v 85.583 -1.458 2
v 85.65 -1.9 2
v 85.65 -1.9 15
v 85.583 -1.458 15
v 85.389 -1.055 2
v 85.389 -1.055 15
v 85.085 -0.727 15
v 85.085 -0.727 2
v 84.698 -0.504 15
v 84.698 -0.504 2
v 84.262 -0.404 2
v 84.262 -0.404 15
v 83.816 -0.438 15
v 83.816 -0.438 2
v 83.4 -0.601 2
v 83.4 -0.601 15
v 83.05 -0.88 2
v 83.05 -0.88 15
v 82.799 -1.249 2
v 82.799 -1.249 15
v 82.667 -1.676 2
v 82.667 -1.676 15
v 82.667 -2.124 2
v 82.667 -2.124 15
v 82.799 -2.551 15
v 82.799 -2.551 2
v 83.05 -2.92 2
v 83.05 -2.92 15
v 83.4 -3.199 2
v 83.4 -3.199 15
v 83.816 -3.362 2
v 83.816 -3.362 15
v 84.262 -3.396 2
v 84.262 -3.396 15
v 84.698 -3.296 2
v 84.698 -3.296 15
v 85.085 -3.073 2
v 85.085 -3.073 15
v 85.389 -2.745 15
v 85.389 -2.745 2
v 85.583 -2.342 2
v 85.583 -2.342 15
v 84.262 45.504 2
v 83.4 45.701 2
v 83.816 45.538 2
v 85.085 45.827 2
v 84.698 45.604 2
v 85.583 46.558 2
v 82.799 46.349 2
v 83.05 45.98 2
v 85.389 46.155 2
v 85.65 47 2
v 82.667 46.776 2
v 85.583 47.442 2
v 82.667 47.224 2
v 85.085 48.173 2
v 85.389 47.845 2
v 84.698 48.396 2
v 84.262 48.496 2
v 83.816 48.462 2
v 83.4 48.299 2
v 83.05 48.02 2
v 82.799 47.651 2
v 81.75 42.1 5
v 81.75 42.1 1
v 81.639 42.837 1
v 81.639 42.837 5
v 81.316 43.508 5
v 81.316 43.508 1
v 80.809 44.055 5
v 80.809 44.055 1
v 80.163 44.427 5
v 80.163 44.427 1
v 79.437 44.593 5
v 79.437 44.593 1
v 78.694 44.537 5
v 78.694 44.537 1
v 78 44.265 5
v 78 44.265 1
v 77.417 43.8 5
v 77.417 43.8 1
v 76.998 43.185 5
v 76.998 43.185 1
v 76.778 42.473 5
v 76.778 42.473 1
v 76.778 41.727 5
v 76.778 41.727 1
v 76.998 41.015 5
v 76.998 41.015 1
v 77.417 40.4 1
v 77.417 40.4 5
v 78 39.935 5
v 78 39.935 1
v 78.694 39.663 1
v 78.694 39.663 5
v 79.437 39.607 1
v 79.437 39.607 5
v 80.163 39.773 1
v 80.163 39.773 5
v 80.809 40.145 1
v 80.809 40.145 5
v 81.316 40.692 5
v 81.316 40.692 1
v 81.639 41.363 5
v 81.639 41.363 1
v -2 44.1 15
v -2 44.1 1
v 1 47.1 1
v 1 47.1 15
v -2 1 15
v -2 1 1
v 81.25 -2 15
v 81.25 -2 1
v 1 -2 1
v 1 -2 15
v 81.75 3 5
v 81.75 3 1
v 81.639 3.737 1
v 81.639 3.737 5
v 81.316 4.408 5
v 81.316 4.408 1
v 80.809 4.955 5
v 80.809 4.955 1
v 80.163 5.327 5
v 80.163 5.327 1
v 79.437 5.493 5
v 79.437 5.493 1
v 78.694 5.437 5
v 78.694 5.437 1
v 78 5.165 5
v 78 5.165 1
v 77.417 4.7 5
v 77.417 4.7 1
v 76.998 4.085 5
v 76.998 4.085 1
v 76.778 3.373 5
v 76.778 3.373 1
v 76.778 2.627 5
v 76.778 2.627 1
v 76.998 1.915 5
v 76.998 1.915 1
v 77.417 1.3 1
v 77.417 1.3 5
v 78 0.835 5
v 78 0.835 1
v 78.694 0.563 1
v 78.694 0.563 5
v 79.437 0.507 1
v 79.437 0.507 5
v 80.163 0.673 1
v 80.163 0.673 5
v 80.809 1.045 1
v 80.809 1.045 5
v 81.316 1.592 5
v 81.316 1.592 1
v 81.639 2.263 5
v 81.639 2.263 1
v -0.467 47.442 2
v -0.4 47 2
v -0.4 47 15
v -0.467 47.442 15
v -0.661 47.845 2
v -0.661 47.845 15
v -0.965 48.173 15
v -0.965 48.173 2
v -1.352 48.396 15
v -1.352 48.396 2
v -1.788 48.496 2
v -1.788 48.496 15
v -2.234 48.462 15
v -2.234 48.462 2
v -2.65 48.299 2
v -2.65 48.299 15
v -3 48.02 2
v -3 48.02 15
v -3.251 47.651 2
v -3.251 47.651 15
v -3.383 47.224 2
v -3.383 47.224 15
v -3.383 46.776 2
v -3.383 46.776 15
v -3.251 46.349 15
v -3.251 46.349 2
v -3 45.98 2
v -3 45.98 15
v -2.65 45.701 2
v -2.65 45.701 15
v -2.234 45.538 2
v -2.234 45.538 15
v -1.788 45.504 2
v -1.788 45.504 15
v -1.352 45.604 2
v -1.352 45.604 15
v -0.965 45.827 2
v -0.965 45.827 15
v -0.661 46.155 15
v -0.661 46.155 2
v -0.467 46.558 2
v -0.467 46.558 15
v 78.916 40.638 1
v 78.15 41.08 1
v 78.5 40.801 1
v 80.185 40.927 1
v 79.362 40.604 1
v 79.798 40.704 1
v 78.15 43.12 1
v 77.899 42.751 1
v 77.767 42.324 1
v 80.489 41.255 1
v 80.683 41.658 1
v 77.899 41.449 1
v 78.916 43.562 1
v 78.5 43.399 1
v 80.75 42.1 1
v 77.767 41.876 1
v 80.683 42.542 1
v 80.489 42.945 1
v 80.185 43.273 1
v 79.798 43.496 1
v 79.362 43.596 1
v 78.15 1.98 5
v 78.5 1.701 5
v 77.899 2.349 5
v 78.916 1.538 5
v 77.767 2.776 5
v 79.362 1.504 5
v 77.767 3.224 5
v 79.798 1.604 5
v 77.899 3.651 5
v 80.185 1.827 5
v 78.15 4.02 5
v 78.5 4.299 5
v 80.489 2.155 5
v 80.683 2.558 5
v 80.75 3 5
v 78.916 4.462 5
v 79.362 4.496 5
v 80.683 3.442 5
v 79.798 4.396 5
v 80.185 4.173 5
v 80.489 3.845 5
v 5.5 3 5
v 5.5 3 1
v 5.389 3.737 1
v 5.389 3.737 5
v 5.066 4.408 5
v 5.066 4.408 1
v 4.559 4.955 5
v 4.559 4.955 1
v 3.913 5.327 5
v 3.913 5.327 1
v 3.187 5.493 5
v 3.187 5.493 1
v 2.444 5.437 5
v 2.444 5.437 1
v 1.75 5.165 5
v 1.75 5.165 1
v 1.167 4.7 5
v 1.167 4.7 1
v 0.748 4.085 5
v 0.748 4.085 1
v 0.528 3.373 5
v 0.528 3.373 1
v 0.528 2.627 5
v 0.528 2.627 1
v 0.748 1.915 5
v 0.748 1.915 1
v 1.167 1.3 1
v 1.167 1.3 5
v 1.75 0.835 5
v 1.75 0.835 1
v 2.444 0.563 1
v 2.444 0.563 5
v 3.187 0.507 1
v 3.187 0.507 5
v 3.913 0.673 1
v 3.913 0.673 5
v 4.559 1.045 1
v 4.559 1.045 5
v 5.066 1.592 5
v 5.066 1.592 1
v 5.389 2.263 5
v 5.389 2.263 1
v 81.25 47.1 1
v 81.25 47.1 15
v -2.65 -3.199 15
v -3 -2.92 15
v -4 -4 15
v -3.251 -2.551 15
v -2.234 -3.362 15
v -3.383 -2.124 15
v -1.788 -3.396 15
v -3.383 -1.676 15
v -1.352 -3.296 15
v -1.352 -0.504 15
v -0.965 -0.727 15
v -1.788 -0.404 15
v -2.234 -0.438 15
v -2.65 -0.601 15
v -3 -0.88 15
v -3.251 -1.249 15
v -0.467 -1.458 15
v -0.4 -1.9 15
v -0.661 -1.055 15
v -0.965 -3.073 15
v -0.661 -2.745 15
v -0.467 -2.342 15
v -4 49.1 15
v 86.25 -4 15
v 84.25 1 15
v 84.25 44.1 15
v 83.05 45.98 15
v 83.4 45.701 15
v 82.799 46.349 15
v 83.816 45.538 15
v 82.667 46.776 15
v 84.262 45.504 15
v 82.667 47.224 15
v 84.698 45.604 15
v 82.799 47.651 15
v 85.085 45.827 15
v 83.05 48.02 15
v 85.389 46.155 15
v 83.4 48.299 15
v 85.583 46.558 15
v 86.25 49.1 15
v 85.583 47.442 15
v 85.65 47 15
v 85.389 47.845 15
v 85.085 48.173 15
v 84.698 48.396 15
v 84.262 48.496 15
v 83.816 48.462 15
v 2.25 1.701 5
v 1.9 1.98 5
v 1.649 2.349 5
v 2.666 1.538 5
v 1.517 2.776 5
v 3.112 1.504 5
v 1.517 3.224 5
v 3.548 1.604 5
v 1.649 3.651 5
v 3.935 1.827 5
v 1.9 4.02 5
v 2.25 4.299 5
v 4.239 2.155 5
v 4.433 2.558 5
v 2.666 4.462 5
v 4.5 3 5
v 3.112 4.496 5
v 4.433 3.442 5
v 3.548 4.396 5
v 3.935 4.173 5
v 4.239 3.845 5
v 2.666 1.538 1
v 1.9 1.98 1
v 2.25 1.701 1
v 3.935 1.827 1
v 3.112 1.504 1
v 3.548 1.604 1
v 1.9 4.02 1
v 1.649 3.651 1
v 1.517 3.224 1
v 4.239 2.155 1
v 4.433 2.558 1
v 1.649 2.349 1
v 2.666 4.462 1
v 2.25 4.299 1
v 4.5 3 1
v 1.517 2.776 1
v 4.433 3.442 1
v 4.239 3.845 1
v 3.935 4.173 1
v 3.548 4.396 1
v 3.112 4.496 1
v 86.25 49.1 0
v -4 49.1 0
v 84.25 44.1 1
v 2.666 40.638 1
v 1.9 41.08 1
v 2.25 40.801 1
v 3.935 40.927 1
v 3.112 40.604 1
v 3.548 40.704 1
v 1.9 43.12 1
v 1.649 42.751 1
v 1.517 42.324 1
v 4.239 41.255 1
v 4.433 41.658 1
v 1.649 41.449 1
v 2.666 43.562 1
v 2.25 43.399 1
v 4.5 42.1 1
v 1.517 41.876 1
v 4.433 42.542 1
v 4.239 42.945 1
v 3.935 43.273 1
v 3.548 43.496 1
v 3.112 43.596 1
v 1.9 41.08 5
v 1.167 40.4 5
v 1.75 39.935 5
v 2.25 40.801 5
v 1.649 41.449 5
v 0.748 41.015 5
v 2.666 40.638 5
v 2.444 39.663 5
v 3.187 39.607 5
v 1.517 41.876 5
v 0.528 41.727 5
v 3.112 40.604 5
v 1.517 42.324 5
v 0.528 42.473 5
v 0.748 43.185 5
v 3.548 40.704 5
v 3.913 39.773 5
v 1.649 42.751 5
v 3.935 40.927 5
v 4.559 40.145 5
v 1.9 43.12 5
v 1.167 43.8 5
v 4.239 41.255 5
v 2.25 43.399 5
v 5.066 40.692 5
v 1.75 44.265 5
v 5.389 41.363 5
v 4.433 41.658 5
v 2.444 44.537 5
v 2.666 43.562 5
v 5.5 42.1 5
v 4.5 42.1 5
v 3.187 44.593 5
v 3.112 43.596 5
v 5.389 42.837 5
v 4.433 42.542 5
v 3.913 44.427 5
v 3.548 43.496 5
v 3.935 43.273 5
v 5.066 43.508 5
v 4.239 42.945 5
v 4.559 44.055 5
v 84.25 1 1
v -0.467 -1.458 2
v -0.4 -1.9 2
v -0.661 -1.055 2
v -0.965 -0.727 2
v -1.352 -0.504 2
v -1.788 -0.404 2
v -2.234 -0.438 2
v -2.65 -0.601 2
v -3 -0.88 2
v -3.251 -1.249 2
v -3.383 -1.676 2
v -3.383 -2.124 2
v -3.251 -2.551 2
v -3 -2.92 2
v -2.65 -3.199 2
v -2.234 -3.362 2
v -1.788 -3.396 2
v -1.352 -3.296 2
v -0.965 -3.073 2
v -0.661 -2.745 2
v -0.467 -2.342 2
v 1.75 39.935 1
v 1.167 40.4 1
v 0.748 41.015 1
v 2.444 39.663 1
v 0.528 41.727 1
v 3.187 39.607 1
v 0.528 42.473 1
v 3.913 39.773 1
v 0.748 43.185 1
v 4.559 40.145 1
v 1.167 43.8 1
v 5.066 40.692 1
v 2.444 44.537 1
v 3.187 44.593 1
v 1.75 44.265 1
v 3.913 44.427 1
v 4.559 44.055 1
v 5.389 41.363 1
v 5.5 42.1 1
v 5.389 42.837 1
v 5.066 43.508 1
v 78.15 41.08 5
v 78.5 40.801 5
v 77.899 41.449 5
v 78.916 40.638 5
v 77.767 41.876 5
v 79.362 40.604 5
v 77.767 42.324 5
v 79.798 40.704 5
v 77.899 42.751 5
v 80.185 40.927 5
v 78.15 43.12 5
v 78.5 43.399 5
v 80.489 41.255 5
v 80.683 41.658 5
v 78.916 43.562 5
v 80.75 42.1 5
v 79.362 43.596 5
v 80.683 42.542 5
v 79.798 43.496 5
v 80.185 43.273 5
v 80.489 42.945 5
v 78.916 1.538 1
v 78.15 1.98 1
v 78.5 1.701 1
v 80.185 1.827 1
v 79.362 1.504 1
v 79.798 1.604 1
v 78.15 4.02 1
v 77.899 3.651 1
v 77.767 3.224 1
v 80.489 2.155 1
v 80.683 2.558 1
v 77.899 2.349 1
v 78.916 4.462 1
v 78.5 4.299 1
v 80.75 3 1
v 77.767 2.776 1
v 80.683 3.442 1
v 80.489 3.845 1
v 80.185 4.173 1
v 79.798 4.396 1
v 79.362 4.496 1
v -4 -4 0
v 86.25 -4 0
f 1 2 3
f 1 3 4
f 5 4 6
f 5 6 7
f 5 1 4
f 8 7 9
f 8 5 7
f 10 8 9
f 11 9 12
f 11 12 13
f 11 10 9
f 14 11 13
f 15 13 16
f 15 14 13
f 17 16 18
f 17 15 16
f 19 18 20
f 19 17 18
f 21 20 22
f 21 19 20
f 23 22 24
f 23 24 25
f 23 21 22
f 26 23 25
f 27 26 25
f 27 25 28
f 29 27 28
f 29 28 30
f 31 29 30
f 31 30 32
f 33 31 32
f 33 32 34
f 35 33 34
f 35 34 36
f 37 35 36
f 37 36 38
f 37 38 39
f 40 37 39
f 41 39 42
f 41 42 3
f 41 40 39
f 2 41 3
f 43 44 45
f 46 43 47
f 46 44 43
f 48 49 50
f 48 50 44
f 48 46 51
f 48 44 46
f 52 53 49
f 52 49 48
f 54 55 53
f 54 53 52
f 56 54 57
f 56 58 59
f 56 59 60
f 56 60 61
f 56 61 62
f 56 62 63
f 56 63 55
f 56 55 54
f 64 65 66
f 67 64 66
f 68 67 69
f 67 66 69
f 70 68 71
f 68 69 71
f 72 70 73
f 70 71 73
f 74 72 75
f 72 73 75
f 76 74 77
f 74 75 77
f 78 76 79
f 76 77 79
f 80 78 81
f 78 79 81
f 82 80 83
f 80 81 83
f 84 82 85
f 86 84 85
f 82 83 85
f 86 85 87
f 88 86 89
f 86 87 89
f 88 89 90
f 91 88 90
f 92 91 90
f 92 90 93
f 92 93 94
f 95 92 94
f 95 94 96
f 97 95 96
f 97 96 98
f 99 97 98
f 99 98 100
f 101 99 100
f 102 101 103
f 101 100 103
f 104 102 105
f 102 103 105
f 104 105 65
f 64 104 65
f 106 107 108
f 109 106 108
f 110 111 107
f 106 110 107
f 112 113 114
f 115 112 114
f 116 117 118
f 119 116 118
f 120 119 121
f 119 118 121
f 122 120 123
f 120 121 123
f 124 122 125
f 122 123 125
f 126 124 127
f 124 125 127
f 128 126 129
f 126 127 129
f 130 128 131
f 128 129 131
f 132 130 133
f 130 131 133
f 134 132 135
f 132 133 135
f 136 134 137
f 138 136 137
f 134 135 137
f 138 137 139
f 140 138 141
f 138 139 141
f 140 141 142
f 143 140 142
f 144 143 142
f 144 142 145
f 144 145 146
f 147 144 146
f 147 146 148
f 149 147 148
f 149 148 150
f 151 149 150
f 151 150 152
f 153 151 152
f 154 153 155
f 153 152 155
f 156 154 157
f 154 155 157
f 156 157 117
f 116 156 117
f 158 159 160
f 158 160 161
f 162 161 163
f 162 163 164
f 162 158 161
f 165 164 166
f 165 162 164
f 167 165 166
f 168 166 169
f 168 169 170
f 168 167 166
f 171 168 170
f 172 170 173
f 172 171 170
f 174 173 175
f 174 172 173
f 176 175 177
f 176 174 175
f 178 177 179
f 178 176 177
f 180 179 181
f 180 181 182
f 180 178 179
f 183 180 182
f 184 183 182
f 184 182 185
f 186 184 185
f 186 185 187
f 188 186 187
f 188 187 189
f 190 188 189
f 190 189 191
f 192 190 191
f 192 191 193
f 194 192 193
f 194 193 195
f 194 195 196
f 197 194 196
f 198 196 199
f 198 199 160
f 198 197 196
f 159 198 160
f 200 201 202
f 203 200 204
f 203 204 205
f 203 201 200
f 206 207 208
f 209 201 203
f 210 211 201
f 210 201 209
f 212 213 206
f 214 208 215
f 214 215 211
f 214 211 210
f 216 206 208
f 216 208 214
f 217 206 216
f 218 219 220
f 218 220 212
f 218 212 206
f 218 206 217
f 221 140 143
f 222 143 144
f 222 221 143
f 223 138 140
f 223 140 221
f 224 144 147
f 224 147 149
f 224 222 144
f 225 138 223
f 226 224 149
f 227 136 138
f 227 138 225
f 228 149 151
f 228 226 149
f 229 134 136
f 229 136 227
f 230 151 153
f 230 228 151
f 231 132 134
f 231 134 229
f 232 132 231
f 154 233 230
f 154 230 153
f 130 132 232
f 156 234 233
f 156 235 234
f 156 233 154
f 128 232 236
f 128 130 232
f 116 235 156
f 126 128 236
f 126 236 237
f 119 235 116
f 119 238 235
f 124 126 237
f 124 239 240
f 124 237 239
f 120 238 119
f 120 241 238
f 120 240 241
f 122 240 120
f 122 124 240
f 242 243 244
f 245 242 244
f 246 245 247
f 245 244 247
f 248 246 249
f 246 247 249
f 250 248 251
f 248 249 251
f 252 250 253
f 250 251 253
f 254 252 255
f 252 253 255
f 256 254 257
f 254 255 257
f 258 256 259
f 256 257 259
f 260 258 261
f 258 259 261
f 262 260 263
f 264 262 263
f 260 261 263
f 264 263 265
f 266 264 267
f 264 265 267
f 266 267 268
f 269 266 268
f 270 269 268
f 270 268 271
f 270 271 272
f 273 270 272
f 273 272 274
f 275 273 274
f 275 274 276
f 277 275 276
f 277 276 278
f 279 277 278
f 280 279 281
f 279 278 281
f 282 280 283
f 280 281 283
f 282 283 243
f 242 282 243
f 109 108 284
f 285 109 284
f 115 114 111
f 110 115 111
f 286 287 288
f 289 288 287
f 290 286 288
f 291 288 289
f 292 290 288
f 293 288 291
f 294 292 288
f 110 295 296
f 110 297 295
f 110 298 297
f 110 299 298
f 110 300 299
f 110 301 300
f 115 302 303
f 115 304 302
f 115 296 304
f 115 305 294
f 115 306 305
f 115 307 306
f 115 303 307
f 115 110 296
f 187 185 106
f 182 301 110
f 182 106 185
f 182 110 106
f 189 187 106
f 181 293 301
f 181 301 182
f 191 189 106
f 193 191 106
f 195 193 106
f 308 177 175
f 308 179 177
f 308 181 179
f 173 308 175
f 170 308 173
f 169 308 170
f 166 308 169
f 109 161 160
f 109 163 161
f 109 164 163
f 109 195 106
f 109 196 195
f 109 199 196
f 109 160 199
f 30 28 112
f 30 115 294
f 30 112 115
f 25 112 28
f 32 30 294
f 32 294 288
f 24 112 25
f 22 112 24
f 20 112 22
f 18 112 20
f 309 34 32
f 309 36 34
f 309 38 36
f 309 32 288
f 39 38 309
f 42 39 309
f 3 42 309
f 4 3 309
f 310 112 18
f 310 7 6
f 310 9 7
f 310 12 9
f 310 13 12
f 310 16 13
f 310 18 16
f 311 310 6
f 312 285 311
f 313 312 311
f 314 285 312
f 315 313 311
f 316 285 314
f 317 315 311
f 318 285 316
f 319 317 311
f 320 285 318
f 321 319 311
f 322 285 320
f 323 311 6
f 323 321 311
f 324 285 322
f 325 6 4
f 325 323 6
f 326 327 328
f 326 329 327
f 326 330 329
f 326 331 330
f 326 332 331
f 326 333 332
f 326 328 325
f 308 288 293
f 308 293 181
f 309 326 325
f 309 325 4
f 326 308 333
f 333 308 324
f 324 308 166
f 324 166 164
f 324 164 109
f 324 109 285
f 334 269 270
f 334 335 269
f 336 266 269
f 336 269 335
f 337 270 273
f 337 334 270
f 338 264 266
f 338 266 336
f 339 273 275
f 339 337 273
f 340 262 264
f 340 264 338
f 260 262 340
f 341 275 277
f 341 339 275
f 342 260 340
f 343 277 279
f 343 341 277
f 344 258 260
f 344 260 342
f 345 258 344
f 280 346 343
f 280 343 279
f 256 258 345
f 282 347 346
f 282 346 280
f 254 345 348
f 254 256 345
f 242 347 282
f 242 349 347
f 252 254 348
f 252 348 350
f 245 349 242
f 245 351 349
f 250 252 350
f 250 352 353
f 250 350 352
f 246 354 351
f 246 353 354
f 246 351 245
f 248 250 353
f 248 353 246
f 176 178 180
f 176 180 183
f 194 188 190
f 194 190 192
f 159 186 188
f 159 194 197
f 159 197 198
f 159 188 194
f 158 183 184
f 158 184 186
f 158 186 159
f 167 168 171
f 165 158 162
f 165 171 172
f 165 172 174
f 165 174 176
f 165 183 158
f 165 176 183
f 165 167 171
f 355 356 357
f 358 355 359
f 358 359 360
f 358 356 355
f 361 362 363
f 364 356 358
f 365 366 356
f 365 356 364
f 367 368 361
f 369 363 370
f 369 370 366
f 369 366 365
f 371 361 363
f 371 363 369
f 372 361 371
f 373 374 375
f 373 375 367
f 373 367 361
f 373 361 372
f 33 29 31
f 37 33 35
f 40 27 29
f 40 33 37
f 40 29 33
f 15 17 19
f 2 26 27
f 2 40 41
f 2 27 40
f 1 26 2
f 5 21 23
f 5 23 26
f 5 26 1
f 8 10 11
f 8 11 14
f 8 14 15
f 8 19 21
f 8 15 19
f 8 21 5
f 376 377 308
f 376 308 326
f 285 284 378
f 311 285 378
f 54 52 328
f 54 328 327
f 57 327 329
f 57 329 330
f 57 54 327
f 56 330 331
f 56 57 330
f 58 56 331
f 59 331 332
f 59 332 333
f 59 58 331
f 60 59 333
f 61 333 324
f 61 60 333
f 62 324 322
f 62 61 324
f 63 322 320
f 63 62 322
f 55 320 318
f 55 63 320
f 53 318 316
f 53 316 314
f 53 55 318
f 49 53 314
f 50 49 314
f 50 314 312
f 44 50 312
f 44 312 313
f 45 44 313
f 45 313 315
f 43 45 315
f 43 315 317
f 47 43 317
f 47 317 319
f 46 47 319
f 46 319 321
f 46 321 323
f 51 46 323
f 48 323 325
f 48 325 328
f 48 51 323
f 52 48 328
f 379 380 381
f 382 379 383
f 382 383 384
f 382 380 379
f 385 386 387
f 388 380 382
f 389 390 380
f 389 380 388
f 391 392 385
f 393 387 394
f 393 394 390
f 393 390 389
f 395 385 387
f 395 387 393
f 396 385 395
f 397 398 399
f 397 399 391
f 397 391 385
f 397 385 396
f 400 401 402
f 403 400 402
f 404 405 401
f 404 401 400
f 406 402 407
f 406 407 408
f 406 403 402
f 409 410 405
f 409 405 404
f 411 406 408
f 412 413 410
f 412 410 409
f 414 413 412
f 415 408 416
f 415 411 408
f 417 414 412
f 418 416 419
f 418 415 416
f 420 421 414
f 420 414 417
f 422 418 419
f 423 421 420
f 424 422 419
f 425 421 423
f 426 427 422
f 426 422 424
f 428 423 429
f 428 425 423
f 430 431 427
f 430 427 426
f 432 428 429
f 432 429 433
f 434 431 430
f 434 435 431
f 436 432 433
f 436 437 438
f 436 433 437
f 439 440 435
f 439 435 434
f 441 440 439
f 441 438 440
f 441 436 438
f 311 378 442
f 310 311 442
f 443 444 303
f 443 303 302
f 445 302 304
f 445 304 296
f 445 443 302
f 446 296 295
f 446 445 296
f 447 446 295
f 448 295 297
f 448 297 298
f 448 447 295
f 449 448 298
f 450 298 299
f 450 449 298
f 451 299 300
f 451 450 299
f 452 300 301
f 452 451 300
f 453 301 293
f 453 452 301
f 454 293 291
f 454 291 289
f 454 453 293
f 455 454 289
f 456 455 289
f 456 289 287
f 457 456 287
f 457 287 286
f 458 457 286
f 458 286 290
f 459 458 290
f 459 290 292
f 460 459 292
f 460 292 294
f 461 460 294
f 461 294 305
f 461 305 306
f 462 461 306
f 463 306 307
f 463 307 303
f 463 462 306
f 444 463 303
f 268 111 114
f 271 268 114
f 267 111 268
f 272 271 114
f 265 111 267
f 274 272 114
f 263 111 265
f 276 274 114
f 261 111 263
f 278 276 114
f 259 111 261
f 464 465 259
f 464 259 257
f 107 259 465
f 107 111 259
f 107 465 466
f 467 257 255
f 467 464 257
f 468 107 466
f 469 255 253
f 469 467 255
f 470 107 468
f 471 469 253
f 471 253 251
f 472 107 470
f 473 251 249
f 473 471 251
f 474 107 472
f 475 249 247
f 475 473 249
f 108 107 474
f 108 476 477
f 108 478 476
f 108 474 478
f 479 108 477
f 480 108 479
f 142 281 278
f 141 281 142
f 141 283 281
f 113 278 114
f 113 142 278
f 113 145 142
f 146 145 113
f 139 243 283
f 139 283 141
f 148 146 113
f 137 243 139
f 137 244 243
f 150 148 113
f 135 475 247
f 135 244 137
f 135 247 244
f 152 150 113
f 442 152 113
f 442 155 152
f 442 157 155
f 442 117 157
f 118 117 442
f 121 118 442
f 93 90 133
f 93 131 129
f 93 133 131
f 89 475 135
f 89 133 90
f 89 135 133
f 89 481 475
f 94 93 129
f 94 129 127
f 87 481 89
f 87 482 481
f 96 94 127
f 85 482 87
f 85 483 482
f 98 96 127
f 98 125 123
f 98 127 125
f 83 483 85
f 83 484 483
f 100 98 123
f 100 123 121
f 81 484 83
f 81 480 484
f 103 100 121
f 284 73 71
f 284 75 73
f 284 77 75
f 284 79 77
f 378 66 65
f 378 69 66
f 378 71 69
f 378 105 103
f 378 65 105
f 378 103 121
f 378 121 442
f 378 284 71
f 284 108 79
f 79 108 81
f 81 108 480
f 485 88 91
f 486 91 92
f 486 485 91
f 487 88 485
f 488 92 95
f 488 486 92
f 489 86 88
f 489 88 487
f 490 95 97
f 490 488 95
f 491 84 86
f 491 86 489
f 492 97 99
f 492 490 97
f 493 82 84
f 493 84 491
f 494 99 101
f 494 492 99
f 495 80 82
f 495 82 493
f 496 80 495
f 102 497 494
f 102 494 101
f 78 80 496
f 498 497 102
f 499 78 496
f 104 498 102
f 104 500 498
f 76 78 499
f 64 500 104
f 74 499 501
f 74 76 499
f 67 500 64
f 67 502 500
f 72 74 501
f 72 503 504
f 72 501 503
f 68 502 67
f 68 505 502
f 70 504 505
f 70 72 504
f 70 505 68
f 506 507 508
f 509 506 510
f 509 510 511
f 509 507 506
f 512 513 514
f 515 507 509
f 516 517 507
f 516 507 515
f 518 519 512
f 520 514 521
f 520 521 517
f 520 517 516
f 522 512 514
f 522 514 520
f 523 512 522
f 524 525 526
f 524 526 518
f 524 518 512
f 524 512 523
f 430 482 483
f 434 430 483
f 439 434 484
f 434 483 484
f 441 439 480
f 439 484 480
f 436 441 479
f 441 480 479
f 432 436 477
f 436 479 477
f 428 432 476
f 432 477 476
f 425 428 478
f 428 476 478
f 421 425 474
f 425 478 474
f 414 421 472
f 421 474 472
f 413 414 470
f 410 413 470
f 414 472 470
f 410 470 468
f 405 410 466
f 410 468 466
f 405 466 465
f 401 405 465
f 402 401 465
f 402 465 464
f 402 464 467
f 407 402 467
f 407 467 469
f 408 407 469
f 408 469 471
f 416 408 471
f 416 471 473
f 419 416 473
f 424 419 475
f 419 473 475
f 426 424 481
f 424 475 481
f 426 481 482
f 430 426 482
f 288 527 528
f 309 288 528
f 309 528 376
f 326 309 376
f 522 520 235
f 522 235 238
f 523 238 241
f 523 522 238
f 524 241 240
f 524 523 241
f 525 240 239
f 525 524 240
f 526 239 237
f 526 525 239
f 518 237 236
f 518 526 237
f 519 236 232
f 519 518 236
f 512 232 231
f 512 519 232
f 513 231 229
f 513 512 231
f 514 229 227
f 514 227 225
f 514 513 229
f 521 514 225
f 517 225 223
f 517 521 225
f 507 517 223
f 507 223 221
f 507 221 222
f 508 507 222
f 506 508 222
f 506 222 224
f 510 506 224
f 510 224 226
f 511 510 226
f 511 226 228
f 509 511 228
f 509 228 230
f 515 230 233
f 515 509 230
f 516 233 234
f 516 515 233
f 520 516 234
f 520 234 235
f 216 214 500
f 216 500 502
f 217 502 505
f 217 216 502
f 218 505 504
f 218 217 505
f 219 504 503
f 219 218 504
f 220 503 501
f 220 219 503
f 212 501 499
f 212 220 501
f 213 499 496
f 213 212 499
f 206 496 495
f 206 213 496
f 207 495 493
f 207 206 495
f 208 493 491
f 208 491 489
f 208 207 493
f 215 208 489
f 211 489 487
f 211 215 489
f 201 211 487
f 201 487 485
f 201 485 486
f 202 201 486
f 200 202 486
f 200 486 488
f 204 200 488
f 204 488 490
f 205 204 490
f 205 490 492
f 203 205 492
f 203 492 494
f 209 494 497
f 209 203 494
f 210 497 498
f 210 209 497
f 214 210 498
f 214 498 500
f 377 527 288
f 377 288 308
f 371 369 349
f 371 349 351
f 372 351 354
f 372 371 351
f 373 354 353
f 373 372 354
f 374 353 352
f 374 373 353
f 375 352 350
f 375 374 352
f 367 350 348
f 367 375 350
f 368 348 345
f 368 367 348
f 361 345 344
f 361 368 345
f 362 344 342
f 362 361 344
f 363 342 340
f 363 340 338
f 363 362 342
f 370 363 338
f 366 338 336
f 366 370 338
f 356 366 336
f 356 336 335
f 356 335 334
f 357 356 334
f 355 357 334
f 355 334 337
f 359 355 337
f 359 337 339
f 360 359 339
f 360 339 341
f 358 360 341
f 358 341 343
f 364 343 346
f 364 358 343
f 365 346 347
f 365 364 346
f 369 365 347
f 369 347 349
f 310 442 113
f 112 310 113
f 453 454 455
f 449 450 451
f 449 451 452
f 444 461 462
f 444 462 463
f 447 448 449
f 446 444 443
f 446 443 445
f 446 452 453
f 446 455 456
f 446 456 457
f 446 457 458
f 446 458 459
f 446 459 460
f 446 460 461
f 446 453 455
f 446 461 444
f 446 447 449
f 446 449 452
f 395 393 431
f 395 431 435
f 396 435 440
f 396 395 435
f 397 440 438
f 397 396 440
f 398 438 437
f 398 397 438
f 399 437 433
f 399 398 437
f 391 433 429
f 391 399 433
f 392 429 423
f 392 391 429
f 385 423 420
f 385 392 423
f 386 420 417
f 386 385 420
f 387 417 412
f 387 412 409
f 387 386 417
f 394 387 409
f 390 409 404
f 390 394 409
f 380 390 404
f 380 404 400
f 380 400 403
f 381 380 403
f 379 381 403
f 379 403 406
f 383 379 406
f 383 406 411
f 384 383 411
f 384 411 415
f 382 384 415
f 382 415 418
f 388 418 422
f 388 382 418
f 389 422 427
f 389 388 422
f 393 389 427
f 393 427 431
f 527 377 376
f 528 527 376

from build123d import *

# Parameters (mm, degrees)
SKETCH019_R      = 1.5
EXTRUDE022_DEPTH = 4
SKETCH020_R      = 2.5
EXTRUDE020_DEPTH = 4
SKETCH022_W      = 90.25
SKETCH022_H      = 53.1
EXTRUDE019_DEPTH = 1
SKETCH038_R      = 1.5
EXTRUDE038_DEPTH = 13
SKETCH021_W      = 90.25
SKETCH021_H      = 53.1
EXTRUDE021_DEPTH = 15


with BuildPart() as extrude_mainboardcase_holes:
    # Sketch019 → Extrude022 (new body)
    with BuildSketch(Plane.XY):
        with Locations((3, 42.1)):
            Circle(SKETCH019_R)
        with Locations((3, 3)):
            Circle(SKETCH019_R)
        with Locations((79.25, 42.1)):
            Circle(SKETCH019_R)
        with Locations((79.25, 3)):
            Circle(SKETCH019_R)
    extrude(amount=EXTRUDE022_DEPTH)


with BuildPart() as extrude_mainboardcase_holes_1:
    # Extrude022 placement: moved
    add(extrude_mainboardcase_holes.part.moved(Location((0, 0, 1))))


with BuildPart() as cut_mainboardcase_standswithholes:
    # Sketch020 → Extrude020 (new body)
    with BuildSketch(Plane.XY):
        with Locations((3, 42.1)):
            Circle(SKETCH020_R)
        with Locations((79.25, 3)):
            Circle(SKETCH020_R)
        with Locations((79.25, 42.1)):
            Circle(SKETCH020_R)
        with Locations((3, 3)):
            Circle(SKETCH020_R)
    extrude(amount=EXTRUDE020_DEPTH)


with BuildPart() as cut_mainboardcase_standswithholes_1:
    # Extrude020 placement: moved
    add(cut_mainboardcase_standswithholes.part.moved(Location((0, 0, 1))))

    # Cut: cut Extrude_MainBoardCase_holes
    add(extrude_mainboardcase_holes_1.part, mode=Mode.SUBTRACT)


with BuildPart() as extrude_mainboardcase_bottom:
    # Sketch022 → Extrude019 (new body)
    with BuildSketch(Plane.XY):
        with Locations((41.125, 22.55)):
            Rectangle(SKETCH022_W, SKETCH022_H)
    extrude(amount=EXTRUDE019_DEPTH)


with BuildPart() as extrude038:
    # Sketch038 → Extrude038 (new body)
    with BuildSketch(Plane.XY):
        with Locations((-1.9, 47)):
            Circle(SKETCH038_R)
        with Locations((84.15, 47)):
            Circle(SKETCH038_R)
        with Locations((-1.9, -1.9)):
            Circle(SKETCH038_R)
        with Locations((84.15, -1.9)):
            Circle(SKETCH038_R)
    extrude(amount=EXTRUDE038_DEPTH)


with BuildPart() as extrude038_1:
    # Extrude038 placement: moved
    add(extrude038.part.moved(Location((0, 0, 2))))


with BuildPart() as fusion_mainboardcase_bottom:
    # Sketch021 → Extrude021 (new body)
    with BuildSketch(Plane.XY):
        with Locations((41.125, 22.55)):
            Rectangle(SKETCH021_W, SKETCH021_H)
        Polygon((1, 47.1), (81.25, 47.1), (84.25, 44.1), (84.25, 1), (81.25, -2), (1, -2), (-2, 1), (-2, 44.1), align=None, mode=Mode.SUBTRACT)
    extrude(amount=EXTRUDE021_DEPTH)

    # Cut009: cut Extrude038
    add(extrude038_1.part, mode=Mode.SUBTRACT)

    # Fusion011: union Cut__MainBoardCase_standsWithHoles, Extrude_MainBoardCase_Bottom
    add(cut_mainboardcase_standswithholes_1.part)
    add(extrude_mainboardcase_bottom.part)


solid = fusion_mainboardcase_bottom.part
